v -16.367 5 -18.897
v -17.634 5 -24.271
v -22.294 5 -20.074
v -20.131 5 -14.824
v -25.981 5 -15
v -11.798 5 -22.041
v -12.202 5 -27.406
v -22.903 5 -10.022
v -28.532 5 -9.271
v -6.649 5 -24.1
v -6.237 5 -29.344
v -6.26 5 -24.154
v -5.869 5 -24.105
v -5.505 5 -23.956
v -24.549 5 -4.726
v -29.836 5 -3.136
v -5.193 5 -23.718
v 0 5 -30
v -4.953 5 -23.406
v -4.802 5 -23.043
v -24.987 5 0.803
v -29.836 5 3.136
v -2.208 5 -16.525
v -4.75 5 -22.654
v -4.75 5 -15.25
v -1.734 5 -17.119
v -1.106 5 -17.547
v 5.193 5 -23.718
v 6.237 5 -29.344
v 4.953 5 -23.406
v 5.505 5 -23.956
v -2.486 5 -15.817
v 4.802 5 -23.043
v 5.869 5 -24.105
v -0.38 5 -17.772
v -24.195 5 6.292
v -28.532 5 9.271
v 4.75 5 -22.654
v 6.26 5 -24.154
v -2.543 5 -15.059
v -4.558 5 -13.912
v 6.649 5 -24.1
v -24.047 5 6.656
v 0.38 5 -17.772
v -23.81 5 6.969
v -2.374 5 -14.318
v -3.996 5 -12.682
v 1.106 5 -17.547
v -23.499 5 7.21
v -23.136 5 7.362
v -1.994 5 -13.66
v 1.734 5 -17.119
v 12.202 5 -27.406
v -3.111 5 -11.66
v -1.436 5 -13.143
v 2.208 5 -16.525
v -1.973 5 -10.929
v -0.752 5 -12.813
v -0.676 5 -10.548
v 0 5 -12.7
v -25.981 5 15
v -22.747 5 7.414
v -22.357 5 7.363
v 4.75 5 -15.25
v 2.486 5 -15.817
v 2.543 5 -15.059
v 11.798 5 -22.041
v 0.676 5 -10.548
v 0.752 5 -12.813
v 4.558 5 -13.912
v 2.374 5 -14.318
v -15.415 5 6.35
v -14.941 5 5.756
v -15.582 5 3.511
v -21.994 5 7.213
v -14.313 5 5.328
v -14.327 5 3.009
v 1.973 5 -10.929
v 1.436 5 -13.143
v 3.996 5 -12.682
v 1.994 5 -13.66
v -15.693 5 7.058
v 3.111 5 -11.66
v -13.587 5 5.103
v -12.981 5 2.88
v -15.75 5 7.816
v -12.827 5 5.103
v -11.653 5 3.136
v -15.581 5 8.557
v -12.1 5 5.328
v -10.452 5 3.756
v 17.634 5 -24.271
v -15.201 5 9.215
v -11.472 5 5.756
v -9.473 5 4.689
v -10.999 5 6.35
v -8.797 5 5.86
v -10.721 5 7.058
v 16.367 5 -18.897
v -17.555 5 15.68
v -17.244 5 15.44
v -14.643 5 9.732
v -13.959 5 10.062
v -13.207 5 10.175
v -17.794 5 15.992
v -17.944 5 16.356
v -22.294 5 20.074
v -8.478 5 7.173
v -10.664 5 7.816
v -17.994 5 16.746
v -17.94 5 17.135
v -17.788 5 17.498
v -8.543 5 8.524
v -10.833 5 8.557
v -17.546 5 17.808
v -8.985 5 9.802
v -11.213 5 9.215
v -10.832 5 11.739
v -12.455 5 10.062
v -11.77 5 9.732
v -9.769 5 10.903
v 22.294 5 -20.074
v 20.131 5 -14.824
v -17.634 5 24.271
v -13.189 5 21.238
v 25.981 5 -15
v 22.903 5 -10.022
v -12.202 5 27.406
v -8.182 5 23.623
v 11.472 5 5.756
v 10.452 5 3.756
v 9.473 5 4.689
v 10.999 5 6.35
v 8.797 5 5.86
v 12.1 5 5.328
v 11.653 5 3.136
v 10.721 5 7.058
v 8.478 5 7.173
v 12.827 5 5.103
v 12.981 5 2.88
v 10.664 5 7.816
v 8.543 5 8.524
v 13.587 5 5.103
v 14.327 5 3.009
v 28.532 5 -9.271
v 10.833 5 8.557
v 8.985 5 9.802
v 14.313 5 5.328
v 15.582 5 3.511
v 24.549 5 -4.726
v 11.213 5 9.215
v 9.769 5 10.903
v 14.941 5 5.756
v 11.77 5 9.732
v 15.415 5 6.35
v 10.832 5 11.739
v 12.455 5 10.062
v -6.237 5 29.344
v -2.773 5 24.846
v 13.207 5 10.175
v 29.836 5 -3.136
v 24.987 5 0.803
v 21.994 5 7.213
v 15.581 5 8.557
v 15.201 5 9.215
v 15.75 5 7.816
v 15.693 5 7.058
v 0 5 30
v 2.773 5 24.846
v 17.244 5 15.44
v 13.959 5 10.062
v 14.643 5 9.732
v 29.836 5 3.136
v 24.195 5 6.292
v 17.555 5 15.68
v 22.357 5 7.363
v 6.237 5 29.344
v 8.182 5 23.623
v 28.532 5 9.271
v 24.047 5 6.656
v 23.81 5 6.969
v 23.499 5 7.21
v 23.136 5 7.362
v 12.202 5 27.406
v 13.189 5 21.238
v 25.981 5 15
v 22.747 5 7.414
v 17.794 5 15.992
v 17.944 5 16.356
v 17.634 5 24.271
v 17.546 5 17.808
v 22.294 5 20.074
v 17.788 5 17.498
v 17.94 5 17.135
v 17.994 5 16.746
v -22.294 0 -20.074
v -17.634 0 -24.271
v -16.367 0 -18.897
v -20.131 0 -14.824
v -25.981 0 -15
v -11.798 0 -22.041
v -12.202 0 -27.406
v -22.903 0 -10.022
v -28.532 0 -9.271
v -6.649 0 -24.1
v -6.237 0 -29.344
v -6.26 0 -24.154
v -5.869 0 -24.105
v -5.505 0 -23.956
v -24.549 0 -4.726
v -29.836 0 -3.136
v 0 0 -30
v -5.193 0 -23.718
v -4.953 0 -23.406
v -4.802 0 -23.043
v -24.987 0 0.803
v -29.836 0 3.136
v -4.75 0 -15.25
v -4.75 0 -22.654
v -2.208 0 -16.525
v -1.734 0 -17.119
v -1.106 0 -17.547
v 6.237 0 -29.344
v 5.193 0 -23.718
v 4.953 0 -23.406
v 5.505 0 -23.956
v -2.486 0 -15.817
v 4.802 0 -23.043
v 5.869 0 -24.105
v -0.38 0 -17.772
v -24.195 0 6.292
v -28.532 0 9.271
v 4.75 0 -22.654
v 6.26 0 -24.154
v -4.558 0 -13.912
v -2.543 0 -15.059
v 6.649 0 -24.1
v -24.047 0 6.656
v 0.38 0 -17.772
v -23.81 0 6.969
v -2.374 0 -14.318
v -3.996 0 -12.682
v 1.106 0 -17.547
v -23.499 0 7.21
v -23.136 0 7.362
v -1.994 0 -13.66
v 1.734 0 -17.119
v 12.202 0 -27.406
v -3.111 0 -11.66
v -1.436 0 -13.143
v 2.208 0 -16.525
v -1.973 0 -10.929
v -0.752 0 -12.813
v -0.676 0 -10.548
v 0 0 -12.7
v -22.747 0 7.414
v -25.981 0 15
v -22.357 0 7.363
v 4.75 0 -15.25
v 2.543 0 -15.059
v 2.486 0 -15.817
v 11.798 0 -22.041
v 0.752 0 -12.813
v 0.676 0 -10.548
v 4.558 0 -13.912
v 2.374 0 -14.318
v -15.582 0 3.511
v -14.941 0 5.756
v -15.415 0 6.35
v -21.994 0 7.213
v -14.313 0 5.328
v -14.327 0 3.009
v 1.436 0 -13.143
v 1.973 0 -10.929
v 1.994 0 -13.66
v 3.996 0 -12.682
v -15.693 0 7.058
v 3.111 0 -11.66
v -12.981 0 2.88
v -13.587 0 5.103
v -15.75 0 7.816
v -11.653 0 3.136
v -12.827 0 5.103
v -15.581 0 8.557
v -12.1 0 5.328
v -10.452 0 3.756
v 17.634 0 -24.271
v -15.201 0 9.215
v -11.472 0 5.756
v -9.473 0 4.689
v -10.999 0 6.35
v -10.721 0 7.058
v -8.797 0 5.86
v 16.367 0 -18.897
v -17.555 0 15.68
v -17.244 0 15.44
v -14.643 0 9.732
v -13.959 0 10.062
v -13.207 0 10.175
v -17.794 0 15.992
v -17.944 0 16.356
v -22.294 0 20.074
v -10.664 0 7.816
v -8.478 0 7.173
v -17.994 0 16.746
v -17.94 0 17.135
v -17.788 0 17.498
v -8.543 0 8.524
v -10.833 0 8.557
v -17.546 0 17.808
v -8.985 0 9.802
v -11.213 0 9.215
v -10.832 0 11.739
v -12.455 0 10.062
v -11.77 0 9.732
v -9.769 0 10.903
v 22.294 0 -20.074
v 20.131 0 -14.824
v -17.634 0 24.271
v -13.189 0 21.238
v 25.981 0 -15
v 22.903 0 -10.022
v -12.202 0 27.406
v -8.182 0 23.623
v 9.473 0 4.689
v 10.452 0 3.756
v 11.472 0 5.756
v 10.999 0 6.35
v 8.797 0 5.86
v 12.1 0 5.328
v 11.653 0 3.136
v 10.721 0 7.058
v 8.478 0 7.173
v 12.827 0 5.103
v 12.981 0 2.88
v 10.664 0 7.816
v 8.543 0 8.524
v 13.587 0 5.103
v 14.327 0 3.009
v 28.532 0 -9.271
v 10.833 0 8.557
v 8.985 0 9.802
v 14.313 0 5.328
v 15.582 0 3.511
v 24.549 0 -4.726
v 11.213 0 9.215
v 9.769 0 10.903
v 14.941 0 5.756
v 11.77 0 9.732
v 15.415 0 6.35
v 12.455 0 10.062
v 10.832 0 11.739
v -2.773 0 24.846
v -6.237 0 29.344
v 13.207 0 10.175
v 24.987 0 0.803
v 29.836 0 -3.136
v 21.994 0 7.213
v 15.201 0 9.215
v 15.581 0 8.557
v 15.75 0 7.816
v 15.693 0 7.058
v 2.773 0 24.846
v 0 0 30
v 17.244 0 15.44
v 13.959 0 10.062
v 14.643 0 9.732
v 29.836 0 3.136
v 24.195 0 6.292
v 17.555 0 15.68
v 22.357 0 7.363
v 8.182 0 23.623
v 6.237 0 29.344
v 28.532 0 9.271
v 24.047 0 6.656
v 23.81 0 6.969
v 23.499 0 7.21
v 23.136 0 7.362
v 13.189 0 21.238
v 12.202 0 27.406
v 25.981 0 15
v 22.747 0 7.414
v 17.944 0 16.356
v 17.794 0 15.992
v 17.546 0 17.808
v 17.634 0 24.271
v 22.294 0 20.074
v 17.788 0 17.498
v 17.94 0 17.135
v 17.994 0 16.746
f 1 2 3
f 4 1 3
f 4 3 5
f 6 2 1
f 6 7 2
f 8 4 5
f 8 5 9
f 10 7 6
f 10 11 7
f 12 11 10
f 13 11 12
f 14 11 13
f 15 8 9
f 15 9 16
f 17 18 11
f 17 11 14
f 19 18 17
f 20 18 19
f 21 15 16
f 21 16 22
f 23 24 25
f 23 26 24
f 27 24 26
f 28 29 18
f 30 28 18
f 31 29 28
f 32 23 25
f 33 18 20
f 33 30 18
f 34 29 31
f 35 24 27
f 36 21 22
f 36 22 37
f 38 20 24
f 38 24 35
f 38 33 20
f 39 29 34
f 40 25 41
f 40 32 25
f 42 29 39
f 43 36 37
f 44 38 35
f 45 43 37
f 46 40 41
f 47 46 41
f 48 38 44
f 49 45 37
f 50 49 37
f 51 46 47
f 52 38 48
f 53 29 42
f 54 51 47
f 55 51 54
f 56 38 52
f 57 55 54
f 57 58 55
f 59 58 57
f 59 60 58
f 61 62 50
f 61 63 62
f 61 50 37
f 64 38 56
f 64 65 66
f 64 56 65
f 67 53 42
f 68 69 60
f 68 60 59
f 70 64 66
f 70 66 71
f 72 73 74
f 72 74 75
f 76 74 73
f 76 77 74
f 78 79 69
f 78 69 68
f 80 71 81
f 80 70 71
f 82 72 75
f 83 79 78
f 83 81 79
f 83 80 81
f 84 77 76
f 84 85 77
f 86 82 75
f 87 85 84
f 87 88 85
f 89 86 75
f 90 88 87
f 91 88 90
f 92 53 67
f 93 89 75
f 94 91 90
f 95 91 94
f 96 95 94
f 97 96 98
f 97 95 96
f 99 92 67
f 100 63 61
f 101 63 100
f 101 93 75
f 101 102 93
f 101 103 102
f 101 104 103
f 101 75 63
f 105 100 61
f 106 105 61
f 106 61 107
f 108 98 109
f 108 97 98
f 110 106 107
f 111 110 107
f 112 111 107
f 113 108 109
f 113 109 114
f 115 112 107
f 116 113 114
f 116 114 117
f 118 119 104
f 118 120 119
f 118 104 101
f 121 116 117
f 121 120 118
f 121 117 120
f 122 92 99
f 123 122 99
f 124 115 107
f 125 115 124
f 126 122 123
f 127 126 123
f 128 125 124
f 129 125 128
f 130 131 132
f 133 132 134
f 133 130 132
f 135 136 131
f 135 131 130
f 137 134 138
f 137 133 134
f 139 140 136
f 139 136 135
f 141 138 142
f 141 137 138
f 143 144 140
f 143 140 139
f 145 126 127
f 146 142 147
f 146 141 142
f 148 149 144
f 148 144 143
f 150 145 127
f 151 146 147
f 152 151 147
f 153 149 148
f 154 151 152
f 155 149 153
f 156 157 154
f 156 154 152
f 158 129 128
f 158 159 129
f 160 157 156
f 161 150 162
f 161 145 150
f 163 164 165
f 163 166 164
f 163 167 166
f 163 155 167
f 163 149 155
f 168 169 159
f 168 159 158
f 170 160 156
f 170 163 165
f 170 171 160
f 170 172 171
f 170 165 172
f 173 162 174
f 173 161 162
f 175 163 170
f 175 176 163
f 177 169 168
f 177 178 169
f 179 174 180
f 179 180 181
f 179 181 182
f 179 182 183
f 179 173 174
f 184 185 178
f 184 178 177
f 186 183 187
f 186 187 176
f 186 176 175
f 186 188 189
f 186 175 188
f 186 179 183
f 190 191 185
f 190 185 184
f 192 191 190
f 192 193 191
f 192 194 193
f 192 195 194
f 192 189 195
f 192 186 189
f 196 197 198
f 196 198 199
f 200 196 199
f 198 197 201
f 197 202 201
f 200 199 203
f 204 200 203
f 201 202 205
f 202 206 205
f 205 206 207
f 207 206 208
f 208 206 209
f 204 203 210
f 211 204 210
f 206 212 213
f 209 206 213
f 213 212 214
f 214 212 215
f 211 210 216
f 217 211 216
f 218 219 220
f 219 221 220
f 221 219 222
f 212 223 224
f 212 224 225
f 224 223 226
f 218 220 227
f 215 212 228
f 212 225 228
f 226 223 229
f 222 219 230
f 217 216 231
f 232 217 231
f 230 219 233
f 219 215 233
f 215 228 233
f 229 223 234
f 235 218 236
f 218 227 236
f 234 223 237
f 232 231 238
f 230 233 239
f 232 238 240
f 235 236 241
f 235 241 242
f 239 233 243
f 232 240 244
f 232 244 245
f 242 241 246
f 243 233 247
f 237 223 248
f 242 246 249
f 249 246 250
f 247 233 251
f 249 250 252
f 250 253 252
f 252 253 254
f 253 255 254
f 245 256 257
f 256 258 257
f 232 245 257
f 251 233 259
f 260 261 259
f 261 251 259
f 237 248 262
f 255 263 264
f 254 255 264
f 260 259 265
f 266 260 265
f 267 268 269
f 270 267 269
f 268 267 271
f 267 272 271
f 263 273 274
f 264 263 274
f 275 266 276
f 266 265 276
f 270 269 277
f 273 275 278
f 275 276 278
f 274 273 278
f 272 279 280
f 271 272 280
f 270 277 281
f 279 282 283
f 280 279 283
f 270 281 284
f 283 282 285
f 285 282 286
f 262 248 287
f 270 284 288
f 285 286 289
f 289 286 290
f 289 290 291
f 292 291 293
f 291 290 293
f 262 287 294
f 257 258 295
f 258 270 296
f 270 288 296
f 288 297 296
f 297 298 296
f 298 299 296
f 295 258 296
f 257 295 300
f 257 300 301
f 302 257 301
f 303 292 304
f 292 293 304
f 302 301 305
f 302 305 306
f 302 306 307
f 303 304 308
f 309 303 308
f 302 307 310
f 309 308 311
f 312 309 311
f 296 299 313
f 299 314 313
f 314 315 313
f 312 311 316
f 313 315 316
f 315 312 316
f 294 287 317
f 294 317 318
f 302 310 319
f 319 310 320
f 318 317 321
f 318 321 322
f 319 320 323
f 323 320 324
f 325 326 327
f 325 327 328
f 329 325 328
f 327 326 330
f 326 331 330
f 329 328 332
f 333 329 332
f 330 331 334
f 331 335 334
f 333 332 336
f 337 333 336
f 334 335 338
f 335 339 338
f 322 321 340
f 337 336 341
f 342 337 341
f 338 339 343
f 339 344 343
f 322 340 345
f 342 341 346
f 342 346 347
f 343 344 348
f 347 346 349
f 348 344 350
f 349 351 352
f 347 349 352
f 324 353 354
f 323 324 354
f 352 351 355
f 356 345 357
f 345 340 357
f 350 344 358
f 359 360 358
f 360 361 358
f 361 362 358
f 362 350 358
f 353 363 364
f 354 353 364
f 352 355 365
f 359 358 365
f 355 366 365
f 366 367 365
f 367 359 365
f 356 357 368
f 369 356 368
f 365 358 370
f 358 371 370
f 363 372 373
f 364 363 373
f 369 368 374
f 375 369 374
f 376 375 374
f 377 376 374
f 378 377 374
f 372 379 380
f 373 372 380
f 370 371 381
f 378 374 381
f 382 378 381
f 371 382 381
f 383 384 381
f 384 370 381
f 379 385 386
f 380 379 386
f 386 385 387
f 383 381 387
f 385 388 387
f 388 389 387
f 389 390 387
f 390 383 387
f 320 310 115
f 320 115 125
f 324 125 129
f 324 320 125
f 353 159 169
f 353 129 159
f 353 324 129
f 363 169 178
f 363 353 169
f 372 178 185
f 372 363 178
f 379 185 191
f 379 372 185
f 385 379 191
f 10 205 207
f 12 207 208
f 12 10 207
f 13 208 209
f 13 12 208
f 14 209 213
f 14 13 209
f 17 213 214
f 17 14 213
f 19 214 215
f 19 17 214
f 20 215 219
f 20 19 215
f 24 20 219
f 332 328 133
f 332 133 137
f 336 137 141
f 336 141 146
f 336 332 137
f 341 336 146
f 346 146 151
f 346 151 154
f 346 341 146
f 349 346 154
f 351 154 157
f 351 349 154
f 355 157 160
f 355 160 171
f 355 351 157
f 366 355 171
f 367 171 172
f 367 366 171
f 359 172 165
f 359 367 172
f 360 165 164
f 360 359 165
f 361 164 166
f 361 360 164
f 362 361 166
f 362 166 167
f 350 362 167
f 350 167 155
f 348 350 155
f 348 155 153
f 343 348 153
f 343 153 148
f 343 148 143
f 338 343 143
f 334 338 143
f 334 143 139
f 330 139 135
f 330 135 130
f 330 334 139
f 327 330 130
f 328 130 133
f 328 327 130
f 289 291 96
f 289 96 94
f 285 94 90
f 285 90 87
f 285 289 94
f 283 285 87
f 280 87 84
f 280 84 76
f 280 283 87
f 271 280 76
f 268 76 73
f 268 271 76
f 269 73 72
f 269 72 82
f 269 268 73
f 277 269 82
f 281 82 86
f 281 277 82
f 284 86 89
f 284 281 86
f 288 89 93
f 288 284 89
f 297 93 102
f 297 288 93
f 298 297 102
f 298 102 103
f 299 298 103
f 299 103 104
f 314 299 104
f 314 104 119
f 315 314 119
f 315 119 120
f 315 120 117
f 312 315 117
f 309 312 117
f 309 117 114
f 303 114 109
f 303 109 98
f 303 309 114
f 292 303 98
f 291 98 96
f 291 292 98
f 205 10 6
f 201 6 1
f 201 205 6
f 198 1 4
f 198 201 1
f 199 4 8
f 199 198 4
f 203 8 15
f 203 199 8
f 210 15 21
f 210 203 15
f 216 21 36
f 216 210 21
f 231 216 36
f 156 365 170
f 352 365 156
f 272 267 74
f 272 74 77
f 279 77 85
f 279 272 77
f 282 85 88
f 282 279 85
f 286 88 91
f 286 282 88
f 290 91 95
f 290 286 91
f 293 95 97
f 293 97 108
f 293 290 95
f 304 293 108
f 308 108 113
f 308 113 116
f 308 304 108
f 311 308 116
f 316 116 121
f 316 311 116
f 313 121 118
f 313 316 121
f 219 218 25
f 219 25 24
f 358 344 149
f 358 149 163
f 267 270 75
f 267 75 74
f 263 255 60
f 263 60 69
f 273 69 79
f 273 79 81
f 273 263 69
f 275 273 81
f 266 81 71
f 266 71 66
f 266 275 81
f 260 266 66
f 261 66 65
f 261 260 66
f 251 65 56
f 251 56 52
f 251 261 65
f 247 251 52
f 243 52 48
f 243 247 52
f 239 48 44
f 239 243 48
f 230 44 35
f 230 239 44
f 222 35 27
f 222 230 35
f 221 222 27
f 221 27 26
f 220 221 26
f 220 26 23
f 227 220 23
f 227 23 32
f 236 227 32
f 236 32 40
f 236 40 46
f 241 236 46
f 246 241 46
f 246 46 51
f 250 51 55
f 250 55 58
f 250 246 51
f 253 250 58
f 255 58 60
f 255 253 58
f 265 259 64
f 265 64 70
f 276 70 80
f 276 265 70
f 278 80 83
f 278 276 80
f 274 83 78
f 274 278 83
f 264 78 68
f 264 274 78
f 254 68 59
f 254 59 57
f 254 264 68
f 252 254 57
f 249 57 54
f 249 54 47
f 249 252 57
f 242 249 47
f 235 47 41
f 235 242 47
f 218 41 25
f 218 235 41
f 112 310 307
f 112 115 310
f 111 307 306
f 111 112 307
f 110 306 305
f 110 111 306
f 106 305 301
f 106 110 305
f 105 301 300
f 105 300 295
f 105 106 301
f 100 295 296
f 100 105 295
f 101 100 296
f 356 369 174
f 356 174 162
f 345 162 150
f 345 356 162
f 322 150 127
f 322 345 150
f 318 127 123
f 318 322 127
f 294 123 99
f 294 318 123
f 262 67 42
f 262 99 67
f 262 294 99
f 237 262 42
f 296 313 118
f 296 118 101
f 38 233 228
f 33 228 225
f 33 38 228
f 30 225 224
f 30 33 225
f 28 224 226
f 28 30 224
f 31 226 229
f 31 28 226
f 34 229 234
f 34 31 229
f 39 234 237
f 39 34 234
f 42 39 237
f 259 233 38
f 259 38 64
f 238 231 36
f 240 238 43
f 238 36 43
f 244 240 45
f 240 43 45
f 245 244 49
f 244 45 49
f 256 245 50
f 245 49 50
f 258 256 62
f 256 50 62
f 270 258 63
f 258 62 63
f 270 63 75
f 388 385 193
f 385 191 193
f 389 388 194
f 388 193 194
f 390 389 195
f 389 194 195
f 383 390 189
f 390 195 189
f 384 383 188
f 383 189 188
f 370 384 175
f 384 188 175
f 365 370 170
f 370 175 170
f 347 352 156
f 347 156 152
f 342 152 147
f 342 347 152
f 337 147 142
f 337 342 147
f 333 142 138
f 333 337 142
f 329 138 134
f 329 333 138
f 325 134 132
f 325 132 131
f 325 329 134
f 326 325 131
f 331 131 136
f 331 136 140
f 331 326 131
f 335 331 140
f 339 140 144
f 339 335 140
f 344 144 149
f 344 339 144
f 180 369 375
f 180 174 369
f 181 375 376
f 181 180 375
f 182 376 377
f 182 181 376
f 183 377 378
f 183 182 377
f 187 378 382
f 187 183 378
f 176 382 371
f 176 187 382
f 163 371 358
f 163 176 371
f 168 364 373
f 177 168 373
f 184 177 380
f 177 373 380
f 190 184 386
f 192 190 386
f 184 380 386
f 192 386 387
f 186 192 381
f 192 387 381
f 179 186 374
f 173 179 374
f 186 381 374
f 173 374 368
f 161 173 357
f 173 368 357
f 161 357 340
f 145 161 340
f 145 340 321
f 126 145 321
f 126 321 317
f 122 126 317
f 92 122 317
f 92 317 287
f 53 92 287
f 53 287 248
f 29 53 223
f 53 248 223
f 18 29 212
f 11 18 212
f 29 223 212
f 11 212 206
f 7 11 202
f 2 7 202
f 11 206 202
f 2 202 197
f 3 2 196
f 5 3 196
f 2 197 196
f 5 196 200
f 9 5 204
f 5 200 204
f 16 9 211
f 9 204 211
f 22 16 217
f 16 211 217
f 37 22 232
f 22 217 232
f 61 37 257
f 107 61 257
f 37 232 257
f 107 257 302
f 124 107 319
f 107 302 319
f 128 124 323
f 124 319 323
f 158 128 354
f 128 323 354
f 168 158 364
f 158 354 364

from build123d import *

# Parameters (mm, degrees)
SKETCH1_R           = 30
SKETCH1_R_2         = 25
BOSS_EXTRUDE1_DEPTH = 5
BOSS_EXTRUDE2_START = -5
SKETCH2_R           = 2.55
BOSS_EXTRUDE2_DEPTH = 5
CIRPATTERN1_COUNT   = 3
FILLET1_R           = 1.5


with BuildPart() as part:
    # Sketch1 → Boss-Extrude1 (new body)
    with BuildSketch(Plane(origin=(0, 0, 0), x_dir=(1, 0, 0), z_dir=(0, 1, 0))):
        with Locations(Location((0, 0, 0), (0, 0, 270))):
            Circle(SKETCH1_R)
        with Locations(Location((0, 0, 0), (0, 0, 270))):
            Circle(SKETCH1_R_2, mode=Mode.SUBTRACT)
    extrude(amount=BOSS_EXTRUDE1_DEPTH)

    # Sketch2 → Boss-Extrude2 (add)
    with BuildSketch(Plane(origin=(0, 5, 0), x_dir=(1, 0, 0), z_dir=(0, 1, 0)).offset(BOSS_EXTRUDE2_START)):
        with BuildLine():
            Line((-4.75, 15.25), (-4.75, 24.544602258))
            ThreePointArc((-4.75, 24.544602258), (0, 25), (4.75, 24.544602258))
            Line((4.75, 24.544602258), (4.75, 15.25))
            ThreePointArc((4.75, 15.25), (0, 10.5), (-4.75, 15.25))
        make_face()
        with Locations(Location((0, 15.25, 0), (0, 0, 270))):
            Circle(SKETCH2_R, mode=Mode.SUBTRACT)
    boss_extrude2 = extrude(amount=BOSS_EXTRUDE2_DEPTH)

    # CirPattern1: Boss-Extrude2 ×3 about axis
    cirpattern1_axis = Axis((0, 0, 0), (0, 1, 0))
    for i in range(1, CIRPATTERN1_COUNT):
        add(boss_extrude2.rotate(cirpattern1_axis, i * 360 / CIRPATTERN1_COUNT))

    # Fillet1
    fillet1_edges = [part.edges().sort_by_distance(p)[0] for p in [
        (4.75, 2.5, -24.544602258),
        (-4.75, 2.5, -24.544602258),
        (18.881249081, 2.5, 16.385921797),
        (23.631249081, 2.5, 8.158680461),
        (-23.631249081, 2.5, 8.158680461),
        (-18.881249081, 2.5, 16.385921797),
    ]]
    fillet(fillet1_edges, radius=FILLET1_R)


solid = part.part
